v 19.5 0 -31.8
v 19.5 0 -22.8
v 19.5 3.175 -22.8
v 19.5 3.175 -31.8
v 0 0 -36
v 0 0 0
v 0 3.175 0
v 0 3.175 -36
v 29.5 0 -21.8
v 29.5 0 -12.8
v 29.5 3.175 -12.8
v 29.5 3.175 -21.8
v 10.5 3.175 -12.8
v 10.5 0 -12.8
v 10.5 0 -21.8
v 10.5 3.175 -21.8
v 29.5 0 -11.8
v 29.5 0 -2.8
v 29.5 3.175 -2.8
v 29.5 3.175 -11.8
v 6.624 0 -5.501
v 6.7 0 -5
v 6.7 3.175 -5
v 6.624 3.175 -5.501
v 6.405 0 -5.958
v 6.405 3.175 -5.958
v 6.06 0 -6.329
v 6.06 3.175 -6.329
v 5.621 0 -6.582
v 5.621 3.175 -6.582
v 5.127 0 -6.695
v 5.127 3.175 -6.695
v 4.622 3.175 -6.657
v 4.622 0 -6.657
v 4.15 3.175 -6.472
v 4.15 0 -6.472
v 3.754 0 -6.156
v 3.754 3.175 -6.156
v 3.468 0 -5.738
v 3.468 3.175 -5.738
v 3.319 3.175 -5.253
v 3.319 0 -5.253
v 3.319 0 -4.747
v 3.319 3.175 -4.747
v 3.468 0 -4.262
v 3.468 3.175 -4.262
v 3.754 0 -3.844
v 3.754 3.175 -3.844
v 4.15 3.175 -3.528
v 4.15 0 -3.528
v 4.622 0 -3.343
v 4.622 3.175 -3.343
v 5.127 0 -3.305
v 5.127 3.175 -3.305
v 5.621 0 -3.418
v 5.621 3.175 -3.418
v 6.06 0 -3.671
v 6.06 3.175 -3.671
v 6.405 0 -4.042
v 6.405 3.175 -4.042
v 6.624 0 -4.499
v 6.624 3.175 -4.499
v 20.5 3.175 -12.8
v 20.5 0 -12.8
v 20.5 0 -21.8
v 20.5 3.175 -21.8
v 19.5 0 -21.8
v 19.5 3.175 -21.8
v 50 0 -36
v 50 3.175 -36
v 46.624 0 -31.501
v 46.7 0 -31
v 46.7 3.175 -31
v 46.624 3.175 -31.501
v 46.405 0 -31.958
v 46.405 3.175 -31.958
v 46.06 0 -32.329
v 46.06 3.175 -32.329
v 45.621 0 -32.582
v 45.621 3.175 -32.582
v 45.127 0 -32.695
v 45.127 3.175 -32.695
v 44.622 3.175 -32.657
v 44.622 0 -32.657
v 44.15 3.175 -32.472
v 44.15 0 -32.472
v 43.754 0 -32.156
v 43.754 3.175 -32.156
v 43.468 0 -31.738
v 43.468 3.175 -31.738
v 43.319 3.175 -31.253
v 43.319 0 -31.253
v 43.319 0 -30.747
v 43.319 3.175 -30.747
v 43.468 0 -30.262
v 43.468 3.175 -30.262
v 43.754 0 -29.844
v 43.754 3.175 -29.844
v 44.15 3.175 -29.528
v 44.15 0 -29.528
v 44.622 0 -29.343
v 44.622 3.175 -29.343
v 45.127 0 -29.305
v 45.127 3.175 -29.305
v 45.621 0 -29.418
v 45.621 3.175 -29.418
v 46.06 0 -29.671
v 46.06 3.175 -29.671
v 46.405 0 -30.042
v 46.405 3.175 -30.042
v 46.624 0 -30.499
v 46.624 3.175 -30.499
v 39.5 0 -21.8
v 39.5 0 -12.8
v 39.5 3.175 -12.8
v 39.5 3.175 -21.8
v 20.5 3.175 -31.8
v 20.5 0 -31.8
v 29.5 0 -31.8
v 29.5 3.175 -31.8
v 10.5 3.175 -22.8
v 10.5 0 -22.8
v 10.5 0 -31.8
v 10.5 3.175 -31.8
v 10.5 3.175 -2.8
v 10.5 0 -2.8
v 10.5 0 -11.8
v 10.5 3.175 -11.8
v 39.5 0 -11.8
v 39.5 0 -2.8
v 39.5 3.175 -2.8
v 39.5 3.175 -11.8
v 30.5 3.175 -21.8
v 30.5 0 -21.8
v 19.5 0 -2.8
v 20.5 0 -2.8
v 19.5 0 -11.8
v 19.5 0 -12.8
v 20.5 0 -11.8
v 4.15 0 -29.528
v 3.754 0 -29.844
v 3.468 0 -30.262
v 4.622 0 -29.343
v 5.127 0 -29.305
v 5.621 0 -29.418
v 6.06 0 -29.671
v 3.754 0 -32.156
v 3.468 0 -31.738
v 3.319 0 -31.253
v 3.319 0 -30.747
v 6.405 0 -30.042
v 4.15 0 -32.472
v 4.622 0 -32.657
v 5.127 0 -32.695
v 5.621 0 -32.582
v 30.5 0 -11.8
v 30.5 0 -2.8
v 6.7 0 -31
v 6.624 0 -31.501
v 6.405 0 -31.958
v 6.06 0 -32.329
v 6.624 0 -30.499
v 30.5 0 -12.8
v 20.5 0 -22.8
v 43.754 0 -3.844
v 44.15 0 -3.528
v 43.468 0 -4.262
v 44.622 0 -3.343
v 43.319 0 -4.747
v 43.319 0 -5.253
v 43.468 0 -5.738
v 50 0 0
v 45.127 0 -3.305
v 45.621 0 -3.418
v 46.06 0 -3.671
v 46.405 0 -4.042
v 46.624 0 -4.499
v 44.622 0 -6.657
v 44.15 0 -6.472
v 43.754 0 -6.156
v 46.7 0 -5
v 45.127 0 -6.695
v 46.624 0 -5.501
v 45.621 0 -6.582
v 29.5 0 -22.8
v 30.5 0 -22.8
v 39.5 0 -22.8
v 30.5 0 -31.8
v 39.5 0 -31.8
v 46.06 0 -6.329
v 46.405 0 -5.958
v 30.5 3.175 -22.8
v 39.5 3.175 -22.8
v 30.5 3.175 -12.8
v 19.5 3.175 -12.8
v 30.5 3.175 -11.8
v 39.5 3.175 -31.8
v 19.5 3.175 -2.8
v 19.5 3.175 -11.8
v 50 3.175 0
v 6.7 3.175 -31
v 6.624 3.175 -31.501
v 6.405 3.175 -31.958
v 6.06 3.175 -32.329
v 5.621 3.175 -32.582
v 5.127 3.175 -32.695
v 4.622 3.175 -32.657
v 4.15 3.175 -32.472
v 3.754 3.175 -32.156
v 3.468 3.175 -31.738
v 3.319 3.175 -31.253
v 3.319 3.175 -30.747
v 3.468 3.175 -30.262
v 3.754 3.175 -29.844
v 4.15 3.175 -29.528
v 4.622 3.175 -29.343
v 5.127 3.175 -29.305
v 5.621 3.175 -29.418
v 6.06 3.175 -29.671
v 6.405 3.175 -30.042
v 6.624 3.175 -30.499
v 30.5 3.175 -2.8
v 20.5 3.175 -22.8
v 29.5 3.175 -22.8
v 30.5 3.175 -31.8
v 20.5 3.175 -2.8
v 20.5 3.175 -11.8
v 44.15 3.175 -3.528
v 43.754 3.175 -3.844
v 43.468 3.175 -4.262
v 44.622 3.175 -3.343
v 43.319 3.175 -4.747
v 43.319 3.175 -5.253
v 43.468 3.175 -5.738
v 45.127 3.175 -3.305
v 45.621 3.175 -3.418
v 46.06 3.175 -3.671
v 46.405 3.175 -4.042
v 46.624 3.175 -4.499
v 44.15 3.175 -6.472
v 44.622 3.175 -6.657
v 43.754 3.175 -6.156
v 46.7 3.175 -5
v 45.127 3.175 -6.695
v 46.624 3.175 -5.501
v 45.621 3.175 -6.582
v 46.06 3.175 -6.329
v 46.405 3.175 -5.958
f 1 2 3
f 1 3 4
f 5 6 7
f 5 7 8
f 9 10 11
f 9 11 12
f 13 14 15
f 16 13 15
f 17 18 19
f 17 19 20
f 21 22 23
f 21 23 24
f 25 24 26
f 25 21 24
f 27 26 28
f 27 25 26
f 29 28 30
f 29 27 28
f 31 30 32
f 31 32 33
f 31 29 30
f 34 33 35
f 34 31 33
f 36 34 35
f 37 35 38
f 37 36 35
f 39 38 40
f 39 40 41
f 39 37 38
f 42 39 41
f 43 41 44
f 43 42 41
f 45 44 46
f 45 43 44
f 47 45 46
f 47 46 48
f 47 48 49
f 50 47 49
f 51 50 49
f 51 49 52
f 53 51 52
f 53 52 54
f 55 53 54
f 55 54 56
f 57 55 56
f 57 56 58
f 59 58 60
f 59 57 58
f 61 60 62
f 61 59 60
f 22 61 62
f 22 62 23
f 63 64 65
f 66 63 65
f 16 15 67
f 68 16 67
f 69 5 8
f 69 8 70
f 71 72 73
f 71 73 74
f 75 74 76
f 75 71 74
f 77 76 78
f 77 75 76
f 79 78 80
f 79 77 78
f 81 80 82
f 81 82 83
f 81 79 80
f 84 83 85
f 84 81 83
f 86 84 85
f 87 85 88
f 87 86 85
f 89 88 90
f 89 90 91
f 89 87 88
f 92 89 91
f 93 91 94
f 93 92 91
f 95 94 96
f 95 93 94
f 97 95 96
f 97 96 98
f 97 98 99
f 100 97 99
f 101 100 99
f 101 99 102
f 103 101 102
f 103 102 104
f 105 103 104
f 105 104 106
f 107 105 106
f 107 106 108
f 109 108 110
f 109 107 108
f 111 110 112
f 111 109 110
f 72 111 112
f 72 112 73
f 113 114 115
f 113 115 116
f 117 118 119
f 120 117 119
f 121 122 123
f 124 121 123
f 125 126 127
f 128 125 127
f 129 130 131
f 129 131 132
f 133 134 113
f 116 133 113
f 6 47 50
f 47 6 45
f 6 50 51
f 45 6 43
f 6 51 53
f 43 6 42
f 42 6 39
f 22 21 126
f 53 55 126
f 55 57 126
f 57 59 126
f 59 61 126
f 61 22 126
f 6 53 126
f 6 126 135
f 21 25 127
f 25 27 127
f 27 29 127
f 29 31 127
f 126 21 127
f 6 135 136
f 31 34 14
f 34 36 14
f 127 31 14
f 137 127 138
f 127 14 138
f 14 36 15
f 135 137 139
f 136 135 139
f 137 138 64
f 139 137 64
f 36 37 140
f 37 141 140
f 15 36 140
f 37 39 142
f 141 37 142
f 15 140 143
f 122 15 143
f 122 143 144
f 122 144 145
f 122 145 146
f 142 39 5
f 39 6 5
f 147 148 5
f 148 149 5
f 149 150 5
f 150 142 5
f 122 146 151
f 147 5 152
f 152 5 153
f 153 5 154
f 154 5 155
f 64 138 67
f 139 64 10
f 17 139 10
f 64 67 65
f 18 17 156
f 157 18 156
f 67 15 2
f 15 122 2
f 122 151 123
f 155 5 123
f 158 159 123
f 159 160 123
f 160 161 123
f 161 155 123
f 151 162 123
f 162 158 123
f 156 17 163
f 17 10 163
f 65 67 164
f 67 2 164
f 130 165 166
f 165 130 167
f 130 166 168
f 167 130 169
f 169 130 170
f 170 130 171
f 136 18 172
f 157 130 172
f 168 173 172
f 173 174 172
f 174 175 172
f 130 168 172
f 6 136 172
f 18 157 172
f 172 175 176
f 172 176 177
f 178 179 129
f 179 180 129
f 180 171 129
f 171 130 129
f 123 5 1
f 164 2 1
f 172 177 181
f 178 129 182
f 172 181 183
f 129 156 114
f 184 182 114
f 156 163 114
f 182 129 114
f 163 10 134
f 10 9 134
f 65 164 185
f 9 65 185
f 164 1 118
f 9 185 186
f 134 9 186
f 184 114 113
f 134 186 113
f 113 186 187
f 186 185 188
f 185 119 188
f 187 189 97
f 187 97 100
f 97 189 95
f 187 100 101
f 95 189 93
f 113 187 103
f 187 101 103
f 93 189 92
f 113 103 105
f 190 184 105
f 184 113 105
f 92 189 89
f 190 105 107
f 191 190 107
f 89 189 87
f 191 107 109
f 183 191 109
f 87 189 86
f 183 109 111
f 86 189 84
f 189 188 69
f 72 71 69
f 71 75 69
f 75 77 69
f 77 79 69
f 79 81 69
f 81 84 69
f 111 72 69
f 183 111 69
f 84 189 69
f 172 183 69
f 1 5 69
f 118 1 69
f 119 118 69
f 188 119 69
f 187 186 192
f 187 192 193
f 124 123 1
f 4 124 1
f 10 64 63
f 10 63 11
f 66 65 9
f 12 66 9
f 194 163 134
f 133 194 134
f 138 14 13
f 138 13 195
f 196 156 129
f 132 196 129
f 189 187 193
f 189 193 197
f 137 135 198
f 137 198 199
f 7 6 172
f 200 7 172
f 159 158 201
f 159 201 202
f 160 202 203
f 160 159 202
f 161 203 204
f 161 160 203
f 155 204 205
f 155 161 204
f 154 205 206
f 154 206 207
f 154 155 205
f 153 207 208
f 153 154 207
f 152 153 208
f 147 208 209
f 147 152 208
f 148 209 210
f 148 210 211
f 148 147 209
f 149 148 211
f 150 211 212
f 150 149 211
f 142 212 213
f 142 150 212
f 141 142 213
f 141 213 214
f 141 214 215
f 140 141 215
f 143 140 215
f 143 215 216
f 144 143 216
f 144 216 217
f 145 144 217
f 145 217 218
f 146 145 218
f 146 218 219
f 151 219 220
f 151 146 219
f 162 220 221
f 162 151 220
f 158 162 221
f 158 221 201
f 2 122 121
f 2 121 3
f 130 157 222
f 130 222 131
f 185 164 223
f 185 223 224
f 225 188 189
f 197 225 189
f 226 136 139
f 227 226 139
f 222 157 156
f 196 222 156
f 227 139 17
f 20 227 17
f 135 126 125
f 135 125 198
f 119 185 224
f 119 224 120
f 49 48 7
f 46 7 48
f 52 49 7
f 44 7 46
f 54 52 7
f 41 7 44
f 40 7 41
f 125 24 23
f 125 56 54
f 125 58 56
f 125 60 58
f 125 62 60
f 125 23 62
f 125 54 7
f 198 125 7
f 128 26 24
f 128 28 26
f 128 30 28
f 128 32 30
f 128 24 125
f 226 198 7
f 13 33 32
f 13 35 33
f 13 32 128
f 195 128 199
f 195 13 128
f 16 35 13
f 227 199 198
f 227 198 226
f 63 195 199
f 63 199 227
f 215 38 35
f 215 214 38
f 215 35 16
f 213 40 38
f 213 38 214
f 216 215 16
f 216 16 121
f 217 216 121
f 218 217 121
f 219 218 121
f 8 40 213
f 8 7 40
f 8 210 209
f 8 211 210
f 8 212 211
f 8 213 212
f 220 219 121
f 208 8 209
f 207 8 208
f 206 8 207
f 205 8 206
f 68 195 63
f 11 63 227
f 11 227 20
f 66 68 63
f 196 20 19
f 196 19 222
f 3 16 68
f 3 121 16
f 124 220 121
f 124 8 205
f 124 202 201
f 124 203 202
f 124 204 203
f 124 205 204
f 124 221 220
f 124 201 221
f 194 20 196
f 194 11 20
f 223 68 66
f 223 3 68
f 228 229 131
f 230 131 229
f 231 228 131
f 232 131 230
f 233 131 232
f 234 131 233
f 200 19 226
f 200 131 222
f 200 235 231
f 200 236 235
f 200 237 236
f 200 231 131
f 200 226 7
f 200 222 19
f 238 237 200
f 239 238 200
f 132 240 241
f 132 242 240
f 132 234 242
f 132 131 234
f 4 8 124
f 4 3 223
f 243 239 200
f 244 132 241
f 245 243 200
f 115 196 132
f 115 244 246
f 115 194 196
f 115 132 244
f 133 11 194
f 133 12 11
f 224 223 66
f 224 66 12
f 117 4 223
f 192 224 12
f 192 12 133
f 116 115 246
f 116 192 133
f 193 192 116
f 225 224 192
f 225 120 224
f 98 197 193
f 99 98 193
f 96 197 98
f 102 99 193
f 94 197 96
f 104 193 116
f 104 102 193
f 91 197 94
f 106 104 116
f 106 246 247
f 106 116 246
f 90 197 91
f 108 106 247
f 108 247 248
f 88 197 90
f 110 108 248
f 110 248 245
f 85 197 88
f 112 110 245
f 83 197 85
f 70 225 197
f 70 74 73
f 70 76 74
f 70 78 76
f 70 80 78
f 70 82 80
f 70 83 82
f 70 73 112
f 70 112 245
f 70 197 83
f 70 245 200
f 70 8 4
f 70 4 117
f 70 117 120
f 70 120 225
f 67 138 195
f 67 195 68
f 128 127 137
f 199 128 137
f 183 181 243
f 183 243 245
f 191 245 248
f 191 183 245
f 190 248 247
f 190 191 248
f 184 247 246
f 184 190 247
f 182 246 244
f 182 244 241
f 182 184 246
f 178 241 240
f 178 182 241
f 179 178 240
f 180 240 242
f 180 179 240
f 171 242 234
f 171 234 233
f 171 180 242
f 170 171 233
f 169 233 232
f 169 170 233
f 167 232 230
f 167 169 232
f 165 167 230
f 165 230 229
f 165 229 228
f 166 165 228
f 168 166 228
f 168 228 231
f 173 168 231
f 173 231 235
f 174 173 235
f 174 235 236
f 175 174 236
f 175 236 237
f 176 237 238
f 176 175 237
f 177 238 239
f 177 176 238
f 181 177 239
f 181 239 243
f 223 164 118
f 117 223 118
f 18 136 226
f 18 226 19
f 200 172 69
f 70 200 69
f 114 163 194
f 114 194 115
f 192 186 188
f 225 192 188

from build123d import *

# Parameters (mm, degrees)
SKETCH1_W           = 50
SKETCH1_H           = 36
SKETCH1_R           = 1.7
SKETCH1_W_2         = 9
SKETCH1_H_2         = 9
BOSS_EXTRUDE1_DEPTH = 3.175


with BuildPart() as part:
    # Sketch1 → Boss-Extrude1 (new body)
    with BuildSketch(Plane(origin=(0, 0, 0), x_dir=(1, 0, 0), z_dir=(0, 1, 0))):
        with Locations((25, 18)):
            Rectangle(SKETCH1_W, SKETCH1_H)
        with Locations((5, 5)):
            Circle(SKETCH1_R, mode=Mode.SUBTRACT)
        with Locations((5, 31)):
            Circle(SKETCH1_R, mode=Mode.SUBTRACT)
        with Locations((45, 31)):
            Circle(SKETCH1_R, mode=Mode.SUBTRACT)
        with Locations((45, 5)):
            Circle(SKETCH1_R, mode=Mode.SUBTRACT)
        with Locations((15, 7.3)):
            Rectangle(SKETCH1_W_2, SKETCH1_H_2, mode=Mode.SUBTRACT)
        with Locations((25, 7.3)):
            Rectangle(SKETCH1_W_2, SKETCH1_H_2, mode=Mode.SUBTRACT)
        with Locations((35, 7.3)):
            Rectangle(SKETCH1_W_2, SKETCH1_H_2, mode=Mode.SUBTRACT)
        with Locations((25, 17.3)):
            Rectangle(SKETCH1_W_2, SKETCH1_H_2, mode=Mode.SUBTRACT)
        with Locations((35, 17.3)):
            Rectangle(SKETCH1_W_2, SKETCH1_H_2, mode=Mode.SUBTRACT)
        with Locations((25, 27.3)):
            Rectangle(SKETCH1_W_2, SKETCH1_H_2, mode=Mode.SUBTRACT)
        with Locations((35, 27.3)):
            Rectangle(SKETCH1_W_2, SKETCH1_H_2, mode=Mode.SUBTRACT)
        with Locations((15, 17.3)):
            Rectangle(SKETCH1_W_2, SKETCH1_H_2, mode=Mode.SUBTRACT)
        with Locations((15, 27.3)):
            Rectangle(SKETCH1_W_2, SKETCH1_H_2, mode=Mode.SUBTRACT)
    extrude(amount=BOSS_EXTRUDE1_DEPTH)


solid = part.part
